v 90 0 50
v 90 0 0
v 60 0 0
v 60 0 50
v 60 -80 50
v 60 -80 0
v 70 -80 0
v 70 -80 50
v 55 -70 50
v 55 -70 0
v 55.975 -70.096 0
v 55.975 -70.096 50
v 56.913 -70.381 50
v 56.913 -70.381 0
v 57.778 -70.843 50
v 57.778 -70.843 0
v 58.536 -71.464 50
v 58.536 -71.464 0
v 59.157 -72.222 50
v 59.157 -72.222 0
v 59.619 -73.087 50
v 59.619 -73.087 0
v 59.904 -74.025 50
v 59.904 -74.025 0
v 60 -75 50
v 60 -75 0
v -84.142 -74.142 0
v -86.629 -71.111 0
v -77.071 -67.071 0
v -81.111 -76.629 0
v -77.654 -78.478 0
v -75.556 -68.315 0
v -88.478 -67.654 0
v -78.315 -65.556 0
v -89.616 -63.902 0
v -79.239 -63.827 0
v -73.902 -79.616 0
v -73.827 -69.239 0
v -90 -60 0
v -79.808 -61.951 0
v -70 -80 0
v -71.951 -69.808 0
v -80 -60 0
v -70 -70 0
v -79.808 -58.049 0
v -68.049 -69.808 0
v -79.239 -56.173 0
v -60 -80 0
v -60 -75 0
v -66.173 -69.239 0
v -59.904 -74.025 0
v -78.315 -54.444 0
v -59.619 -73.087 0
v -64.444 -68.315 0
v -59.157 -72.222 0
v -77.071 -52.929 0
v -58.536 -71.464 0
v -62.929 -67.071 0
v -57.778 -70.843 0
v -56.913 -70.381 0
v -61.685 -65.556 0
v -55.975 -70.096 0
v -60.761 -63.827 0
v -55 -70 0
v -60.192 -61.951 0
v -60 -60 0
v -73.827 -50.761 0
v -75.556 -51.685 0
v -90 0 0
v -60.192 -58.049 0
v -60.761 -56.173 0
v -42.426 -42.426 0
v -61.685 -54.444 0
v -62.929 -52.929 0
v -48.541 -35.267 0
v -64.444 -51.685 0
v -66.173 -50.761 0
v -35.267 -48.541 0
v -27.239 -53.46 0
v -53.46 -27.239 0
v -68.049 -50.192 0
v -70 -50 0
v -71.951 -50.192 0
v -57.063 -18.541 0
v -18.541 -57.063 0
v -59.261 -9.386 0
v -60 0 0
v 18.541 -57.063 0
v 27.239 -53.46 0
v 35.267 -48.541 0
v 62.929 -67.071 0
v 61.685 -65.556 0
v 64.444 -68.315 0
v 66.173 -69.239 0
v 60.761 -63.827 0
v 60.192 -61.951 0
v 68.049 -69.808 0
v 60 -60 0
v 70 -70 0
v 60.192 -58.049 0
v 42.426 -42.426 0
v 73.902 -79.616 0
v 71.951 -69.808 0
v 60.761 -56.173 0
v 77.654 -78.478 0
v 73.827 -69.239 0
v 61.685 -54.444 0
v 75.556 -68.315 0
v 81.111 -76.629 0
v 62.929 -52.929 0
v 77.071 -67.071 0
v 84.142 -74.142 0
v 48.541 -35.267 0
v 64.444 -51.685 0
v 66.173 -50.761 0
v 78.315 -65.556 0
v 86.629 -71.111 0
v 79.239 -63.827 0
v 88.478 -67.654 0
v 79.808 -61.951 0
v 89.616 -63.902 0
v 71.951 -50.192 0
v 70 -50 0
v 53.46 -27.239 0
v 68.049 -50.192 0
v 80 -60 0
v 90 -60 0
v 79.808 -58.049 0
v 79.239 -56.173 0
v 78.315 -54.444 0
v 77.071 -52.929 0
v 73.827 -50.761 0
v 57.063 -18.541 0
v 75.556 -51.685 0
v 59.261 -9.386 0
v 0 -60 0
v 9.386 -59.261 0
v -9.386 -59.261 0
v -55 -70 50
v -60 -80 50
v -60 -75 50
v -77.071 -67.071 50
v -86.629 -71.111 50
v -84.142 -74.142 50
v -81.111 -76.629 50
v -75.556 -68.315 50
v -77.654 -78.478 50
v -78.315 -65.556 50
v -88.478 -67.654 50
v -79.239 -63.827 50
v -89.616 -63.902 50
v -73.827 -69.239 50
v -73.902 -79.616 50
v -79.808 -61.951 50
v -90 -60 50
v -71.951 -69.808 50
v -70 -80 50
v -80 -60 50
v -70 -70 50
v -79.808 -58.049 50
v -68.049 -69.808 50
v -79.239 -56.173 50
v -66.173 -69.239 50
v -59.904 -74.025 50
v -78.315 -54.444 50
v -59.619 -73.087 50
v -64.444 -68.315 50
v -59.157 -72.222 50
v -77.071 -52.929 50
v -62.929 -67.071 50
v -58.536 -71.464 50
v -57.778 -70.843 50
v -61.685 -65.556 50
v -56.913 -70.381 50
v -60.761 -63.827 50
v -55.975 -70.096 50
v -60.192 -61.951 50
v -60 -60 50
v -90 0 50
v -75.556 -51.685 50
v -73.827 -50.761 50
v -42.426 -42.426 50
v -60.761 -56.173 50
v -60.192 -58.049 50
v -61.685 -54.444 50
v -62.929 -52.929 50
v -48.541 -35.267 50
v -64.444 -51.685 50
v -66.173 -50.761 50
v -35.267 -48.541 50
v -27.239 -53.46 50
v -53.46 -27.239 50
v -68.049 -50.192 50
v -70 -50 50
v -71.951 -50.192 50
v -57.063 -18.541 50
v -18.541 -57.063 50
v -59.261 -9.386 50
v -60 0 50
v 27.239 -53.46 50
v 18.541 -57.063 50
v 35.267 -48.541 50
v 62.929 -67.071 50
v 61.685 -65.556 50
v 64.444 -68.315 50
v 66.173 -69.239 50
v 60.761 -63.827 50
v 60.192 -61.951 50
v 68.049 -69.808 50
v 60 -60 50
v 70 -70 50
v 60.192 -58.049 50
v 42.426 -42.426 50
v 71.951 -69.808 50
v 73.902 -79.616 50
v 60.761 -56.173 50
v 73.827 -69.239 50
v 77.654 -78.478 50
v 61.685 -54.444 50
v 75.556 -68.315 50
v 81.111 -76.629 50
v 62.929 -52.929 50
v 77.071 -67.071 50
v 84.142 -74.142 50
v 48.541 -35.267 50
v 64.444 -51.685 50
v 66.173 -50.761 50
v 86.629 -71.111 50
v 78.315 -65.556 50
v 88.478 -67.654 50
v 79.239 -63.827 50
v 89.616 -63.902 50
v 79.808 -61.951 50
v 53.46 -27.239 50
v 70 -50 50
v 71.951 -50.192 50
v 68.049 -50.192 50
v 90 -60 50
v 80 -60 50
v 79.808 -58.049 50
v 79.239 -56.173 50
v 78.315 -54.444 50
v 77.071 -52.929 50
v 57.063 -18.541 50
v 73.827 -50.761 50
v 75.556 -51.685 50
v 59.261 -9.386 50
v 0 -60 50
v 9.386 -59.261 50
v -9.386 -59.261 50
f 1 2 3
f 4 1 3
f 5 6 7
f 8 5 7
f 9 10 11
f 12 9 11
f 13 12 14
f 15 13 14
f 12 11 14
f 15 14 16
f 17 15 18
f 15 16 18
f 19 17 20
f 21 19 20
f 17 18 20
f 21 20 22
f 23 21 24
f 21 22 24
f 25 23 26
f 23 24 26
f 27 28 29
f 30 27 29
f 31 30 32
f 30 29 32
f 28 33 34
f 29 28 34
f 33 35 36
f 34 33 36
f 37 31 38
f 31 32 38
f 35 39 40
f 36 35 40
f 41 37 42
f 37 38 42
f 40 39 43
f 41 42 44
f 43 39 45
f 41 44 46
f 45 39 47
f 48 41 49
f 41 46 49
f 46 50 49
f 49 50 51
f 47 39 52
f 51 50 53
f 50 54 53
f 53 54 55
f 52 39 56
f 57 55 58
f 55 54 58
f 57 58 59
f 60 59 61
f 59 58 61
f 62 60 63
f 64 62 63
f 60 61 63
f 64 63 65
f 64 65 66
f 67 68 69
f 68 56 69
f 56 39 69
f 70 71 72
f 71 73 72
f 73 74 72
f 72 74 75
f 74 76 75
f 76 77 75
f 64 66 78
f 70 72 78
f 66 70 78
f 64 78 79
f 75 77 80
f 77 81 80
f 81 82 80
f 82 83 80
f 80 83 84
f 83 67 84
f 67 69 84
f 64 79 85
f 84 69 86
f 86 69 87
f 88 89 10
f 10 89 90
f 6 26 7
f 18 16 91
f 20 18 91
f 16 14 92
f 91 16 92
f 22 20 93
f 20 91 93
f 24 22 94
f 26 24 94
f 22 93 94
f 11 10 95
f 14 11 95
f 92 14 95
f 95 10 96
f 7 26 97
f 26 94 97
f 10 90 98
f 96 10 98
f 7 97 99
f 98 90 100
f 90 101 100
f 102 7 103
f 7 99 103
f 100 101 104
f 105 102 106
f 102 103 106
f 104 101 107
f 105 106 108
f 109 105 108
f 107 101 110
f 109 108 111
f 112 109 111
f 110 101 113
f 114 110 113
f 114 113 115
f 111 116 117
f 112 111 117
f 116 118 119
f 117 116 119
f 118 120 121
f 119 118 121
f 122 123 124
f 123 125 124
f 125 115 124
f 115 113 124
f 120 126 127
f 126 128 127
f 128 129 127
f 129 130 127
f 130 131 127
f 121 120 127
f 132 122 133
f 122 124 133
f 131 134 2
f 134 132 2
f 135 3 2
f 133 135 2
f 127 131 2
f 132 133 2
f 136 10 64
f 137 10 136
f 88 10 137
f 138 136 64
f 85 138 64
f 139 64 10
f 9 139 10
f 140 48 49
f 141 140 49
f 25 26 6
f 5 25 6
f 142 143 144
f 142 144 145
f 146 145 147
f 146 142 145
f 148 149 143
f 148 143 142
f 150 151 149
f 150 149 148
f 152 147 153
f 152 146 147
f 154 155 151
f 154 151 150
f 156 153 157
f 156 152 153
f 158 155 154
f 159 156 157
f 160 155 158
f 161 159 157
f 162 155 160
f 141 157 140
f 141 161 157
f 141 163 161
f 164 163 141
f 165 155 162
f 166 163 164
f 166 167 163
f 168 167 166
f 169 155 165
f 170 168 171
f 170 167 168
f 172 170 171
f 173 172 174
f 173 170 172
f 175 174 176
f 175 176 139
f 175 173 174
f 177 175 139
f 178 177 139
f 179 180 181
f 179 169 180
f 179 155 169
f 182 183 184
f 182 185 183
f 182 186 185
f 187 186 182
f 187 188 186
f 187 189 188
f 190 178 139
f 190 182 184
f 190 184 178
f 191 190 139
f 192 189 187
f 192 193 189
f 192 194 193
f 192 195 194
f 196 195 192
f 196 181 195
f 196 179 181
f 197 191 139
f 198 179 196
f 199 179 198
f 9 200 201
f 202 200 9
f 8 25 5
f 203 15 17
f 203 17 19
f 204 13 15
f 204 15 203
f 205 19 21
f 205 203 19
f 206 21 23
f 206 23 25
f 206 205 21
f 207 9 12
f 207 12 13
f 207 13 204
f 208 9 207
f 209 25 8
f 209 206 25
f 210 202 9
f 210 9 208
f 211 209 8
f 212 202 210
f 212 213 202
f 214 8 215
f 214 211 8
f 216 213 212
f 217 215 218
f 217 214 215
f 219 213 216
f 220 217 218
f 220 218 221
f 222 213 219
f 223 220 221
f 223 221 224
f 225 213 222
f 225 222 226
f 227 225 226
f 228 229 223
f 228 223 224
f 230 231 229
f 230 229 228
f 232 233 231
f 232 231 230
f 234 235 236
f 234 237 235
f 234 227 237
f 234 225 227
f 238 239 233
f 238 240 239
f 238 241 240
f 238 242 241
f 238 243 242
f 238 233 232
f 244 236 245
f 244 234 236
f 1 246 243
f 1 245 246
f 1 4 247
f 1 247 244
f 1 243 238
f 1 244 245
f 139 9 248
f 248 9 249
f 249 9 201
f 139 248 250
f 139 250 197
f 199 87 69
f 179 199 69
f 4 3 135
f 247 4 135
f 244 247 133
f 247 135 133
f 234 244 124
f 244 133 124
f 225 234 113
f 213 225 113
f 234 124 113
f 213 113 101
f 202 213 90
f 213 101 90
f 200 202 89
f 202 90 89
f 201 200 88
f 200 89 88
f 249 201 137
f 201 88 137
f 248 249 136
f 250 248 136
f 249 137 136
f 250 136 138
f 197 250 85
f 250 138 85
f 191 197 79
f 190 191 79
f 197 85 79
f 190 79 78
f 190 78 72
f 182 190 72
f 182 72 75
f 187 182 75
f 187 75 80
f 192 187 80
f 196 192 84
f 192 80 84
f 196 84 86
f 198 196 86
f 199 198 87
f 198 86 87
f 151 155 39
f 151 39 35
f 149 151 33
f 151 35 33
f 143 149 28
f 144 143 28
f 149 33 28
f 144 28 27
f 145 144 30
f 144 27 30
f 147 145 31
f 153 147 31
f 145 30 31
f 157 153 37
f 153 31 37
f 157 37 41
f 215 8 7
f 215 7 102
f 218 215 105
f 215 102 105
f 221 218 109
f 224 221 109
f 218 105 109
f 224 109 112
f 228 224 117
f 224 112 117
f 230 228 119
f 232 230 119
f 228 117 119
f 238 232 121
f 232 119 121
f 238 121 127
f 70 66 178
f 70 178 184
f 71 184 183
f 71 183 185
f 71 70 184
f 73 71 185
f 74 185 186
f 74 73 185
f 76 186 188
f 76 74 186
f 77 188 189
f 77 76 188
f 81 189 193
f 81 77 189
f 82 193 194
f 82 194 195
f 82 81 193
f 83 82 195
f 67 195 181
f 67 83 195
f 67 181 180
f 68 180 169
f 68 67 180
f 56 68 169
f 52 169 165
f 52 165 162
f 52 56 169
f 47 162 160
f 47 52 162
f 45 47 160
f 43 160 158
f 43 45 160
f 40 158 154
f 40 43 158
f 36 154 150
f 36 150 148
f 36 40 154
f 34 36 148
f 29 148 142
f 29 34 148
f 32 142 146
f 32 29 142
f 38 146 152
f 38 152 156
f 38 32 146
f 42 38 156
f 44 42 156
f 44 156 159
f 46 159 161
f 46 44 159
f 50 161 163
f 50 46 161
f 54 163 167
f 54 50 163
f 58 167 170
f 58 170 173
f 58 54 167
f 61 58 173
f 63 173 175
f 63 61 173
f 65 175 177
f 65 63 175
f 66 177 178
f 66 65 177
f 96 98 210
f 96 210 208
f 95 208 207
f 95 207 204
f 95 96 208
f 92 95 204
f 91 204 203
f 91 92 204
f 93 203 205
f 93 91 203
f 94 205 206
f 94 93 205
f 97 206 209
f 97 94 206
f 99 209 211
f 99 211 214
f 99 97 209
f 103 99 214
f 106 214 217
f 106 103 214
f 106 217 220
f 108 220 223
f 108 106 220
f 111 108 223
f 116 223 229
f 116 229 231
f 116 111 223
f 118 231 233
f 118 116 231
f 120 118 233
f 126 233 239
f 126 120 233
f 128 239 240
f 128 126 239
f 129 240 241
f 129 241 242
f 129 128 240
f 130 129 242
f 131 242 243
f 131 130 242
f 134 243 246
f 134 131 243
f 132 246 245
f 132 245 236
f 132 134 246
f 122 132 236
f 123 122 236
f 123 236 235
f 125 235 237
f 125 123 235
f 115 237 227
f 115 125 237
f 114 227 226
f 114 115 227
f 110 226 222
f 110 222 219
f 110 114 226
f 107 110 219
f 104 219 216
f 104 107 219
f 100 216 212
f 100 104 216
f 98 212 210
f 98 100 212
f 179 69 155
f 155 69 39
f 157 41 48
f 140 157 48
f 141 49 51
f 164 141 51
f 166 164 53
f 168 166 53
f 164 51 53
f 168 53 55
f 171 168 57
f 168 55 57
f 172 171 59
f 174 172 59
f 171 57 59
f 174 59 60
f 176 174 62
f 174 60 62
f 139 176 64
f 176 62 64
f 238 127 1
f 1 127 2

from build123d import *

# Parameters (mm, degrees)
SKETCH2_R           = 10
BOSS_EXTRUDE1_DEPTH = 50


with BuildPart() as part:
    # Sketch2 → Boss-Extrude1 (new body)
    with BuildSketch(Plane.XY):
        with BuildLine():
            Line((-60, 0), (-90, 0))
            Line((-90, 0), (-90, -7.723724189))
            Line((-90, -7.723724189), (-90, -60))
            ThreePointArc((-90, -60), (-84.142135624, -74.142135624), (-70, -80))
            Line((-70, -80), (-60, -80))
            Line((-60, -80), (-60, -75))
            ThreePointArc((-60, -75), (-58.535533906, -71.464466094), (-55, -70))
            Line((-55, -70), (55, -70))
            ThreePointArc((55, -70), (58.535533906, -71.464466094), (60, -75))
            Line((60, -75), (60, -80))
            Line((60, -80), (70, -80))
            ThreePointArc((70, -80), (84.142135624, -74.142135624), (90, -60))
            Line((90, -60), (90, -7.723724189))
            Line((90, -7.723724189), (90, 0))
            Line((90, 0), (60, 0))
            ThreePointArc((60, 0), (0, -60), (-60, 0))
        make_face()
        with Locations((-70, -60)):
            Circle(SKETCH2_R, mode=Mode.SUBTRACT)
        with Locations(Location((70, -60, 0), (0, 0, 180))):
            Circle(SKETCH2_R, mode=Mode.SUBTRACT)
    extrude(amount=BOSS_EXTRUDE1_DEPTH)


solid = part.part
